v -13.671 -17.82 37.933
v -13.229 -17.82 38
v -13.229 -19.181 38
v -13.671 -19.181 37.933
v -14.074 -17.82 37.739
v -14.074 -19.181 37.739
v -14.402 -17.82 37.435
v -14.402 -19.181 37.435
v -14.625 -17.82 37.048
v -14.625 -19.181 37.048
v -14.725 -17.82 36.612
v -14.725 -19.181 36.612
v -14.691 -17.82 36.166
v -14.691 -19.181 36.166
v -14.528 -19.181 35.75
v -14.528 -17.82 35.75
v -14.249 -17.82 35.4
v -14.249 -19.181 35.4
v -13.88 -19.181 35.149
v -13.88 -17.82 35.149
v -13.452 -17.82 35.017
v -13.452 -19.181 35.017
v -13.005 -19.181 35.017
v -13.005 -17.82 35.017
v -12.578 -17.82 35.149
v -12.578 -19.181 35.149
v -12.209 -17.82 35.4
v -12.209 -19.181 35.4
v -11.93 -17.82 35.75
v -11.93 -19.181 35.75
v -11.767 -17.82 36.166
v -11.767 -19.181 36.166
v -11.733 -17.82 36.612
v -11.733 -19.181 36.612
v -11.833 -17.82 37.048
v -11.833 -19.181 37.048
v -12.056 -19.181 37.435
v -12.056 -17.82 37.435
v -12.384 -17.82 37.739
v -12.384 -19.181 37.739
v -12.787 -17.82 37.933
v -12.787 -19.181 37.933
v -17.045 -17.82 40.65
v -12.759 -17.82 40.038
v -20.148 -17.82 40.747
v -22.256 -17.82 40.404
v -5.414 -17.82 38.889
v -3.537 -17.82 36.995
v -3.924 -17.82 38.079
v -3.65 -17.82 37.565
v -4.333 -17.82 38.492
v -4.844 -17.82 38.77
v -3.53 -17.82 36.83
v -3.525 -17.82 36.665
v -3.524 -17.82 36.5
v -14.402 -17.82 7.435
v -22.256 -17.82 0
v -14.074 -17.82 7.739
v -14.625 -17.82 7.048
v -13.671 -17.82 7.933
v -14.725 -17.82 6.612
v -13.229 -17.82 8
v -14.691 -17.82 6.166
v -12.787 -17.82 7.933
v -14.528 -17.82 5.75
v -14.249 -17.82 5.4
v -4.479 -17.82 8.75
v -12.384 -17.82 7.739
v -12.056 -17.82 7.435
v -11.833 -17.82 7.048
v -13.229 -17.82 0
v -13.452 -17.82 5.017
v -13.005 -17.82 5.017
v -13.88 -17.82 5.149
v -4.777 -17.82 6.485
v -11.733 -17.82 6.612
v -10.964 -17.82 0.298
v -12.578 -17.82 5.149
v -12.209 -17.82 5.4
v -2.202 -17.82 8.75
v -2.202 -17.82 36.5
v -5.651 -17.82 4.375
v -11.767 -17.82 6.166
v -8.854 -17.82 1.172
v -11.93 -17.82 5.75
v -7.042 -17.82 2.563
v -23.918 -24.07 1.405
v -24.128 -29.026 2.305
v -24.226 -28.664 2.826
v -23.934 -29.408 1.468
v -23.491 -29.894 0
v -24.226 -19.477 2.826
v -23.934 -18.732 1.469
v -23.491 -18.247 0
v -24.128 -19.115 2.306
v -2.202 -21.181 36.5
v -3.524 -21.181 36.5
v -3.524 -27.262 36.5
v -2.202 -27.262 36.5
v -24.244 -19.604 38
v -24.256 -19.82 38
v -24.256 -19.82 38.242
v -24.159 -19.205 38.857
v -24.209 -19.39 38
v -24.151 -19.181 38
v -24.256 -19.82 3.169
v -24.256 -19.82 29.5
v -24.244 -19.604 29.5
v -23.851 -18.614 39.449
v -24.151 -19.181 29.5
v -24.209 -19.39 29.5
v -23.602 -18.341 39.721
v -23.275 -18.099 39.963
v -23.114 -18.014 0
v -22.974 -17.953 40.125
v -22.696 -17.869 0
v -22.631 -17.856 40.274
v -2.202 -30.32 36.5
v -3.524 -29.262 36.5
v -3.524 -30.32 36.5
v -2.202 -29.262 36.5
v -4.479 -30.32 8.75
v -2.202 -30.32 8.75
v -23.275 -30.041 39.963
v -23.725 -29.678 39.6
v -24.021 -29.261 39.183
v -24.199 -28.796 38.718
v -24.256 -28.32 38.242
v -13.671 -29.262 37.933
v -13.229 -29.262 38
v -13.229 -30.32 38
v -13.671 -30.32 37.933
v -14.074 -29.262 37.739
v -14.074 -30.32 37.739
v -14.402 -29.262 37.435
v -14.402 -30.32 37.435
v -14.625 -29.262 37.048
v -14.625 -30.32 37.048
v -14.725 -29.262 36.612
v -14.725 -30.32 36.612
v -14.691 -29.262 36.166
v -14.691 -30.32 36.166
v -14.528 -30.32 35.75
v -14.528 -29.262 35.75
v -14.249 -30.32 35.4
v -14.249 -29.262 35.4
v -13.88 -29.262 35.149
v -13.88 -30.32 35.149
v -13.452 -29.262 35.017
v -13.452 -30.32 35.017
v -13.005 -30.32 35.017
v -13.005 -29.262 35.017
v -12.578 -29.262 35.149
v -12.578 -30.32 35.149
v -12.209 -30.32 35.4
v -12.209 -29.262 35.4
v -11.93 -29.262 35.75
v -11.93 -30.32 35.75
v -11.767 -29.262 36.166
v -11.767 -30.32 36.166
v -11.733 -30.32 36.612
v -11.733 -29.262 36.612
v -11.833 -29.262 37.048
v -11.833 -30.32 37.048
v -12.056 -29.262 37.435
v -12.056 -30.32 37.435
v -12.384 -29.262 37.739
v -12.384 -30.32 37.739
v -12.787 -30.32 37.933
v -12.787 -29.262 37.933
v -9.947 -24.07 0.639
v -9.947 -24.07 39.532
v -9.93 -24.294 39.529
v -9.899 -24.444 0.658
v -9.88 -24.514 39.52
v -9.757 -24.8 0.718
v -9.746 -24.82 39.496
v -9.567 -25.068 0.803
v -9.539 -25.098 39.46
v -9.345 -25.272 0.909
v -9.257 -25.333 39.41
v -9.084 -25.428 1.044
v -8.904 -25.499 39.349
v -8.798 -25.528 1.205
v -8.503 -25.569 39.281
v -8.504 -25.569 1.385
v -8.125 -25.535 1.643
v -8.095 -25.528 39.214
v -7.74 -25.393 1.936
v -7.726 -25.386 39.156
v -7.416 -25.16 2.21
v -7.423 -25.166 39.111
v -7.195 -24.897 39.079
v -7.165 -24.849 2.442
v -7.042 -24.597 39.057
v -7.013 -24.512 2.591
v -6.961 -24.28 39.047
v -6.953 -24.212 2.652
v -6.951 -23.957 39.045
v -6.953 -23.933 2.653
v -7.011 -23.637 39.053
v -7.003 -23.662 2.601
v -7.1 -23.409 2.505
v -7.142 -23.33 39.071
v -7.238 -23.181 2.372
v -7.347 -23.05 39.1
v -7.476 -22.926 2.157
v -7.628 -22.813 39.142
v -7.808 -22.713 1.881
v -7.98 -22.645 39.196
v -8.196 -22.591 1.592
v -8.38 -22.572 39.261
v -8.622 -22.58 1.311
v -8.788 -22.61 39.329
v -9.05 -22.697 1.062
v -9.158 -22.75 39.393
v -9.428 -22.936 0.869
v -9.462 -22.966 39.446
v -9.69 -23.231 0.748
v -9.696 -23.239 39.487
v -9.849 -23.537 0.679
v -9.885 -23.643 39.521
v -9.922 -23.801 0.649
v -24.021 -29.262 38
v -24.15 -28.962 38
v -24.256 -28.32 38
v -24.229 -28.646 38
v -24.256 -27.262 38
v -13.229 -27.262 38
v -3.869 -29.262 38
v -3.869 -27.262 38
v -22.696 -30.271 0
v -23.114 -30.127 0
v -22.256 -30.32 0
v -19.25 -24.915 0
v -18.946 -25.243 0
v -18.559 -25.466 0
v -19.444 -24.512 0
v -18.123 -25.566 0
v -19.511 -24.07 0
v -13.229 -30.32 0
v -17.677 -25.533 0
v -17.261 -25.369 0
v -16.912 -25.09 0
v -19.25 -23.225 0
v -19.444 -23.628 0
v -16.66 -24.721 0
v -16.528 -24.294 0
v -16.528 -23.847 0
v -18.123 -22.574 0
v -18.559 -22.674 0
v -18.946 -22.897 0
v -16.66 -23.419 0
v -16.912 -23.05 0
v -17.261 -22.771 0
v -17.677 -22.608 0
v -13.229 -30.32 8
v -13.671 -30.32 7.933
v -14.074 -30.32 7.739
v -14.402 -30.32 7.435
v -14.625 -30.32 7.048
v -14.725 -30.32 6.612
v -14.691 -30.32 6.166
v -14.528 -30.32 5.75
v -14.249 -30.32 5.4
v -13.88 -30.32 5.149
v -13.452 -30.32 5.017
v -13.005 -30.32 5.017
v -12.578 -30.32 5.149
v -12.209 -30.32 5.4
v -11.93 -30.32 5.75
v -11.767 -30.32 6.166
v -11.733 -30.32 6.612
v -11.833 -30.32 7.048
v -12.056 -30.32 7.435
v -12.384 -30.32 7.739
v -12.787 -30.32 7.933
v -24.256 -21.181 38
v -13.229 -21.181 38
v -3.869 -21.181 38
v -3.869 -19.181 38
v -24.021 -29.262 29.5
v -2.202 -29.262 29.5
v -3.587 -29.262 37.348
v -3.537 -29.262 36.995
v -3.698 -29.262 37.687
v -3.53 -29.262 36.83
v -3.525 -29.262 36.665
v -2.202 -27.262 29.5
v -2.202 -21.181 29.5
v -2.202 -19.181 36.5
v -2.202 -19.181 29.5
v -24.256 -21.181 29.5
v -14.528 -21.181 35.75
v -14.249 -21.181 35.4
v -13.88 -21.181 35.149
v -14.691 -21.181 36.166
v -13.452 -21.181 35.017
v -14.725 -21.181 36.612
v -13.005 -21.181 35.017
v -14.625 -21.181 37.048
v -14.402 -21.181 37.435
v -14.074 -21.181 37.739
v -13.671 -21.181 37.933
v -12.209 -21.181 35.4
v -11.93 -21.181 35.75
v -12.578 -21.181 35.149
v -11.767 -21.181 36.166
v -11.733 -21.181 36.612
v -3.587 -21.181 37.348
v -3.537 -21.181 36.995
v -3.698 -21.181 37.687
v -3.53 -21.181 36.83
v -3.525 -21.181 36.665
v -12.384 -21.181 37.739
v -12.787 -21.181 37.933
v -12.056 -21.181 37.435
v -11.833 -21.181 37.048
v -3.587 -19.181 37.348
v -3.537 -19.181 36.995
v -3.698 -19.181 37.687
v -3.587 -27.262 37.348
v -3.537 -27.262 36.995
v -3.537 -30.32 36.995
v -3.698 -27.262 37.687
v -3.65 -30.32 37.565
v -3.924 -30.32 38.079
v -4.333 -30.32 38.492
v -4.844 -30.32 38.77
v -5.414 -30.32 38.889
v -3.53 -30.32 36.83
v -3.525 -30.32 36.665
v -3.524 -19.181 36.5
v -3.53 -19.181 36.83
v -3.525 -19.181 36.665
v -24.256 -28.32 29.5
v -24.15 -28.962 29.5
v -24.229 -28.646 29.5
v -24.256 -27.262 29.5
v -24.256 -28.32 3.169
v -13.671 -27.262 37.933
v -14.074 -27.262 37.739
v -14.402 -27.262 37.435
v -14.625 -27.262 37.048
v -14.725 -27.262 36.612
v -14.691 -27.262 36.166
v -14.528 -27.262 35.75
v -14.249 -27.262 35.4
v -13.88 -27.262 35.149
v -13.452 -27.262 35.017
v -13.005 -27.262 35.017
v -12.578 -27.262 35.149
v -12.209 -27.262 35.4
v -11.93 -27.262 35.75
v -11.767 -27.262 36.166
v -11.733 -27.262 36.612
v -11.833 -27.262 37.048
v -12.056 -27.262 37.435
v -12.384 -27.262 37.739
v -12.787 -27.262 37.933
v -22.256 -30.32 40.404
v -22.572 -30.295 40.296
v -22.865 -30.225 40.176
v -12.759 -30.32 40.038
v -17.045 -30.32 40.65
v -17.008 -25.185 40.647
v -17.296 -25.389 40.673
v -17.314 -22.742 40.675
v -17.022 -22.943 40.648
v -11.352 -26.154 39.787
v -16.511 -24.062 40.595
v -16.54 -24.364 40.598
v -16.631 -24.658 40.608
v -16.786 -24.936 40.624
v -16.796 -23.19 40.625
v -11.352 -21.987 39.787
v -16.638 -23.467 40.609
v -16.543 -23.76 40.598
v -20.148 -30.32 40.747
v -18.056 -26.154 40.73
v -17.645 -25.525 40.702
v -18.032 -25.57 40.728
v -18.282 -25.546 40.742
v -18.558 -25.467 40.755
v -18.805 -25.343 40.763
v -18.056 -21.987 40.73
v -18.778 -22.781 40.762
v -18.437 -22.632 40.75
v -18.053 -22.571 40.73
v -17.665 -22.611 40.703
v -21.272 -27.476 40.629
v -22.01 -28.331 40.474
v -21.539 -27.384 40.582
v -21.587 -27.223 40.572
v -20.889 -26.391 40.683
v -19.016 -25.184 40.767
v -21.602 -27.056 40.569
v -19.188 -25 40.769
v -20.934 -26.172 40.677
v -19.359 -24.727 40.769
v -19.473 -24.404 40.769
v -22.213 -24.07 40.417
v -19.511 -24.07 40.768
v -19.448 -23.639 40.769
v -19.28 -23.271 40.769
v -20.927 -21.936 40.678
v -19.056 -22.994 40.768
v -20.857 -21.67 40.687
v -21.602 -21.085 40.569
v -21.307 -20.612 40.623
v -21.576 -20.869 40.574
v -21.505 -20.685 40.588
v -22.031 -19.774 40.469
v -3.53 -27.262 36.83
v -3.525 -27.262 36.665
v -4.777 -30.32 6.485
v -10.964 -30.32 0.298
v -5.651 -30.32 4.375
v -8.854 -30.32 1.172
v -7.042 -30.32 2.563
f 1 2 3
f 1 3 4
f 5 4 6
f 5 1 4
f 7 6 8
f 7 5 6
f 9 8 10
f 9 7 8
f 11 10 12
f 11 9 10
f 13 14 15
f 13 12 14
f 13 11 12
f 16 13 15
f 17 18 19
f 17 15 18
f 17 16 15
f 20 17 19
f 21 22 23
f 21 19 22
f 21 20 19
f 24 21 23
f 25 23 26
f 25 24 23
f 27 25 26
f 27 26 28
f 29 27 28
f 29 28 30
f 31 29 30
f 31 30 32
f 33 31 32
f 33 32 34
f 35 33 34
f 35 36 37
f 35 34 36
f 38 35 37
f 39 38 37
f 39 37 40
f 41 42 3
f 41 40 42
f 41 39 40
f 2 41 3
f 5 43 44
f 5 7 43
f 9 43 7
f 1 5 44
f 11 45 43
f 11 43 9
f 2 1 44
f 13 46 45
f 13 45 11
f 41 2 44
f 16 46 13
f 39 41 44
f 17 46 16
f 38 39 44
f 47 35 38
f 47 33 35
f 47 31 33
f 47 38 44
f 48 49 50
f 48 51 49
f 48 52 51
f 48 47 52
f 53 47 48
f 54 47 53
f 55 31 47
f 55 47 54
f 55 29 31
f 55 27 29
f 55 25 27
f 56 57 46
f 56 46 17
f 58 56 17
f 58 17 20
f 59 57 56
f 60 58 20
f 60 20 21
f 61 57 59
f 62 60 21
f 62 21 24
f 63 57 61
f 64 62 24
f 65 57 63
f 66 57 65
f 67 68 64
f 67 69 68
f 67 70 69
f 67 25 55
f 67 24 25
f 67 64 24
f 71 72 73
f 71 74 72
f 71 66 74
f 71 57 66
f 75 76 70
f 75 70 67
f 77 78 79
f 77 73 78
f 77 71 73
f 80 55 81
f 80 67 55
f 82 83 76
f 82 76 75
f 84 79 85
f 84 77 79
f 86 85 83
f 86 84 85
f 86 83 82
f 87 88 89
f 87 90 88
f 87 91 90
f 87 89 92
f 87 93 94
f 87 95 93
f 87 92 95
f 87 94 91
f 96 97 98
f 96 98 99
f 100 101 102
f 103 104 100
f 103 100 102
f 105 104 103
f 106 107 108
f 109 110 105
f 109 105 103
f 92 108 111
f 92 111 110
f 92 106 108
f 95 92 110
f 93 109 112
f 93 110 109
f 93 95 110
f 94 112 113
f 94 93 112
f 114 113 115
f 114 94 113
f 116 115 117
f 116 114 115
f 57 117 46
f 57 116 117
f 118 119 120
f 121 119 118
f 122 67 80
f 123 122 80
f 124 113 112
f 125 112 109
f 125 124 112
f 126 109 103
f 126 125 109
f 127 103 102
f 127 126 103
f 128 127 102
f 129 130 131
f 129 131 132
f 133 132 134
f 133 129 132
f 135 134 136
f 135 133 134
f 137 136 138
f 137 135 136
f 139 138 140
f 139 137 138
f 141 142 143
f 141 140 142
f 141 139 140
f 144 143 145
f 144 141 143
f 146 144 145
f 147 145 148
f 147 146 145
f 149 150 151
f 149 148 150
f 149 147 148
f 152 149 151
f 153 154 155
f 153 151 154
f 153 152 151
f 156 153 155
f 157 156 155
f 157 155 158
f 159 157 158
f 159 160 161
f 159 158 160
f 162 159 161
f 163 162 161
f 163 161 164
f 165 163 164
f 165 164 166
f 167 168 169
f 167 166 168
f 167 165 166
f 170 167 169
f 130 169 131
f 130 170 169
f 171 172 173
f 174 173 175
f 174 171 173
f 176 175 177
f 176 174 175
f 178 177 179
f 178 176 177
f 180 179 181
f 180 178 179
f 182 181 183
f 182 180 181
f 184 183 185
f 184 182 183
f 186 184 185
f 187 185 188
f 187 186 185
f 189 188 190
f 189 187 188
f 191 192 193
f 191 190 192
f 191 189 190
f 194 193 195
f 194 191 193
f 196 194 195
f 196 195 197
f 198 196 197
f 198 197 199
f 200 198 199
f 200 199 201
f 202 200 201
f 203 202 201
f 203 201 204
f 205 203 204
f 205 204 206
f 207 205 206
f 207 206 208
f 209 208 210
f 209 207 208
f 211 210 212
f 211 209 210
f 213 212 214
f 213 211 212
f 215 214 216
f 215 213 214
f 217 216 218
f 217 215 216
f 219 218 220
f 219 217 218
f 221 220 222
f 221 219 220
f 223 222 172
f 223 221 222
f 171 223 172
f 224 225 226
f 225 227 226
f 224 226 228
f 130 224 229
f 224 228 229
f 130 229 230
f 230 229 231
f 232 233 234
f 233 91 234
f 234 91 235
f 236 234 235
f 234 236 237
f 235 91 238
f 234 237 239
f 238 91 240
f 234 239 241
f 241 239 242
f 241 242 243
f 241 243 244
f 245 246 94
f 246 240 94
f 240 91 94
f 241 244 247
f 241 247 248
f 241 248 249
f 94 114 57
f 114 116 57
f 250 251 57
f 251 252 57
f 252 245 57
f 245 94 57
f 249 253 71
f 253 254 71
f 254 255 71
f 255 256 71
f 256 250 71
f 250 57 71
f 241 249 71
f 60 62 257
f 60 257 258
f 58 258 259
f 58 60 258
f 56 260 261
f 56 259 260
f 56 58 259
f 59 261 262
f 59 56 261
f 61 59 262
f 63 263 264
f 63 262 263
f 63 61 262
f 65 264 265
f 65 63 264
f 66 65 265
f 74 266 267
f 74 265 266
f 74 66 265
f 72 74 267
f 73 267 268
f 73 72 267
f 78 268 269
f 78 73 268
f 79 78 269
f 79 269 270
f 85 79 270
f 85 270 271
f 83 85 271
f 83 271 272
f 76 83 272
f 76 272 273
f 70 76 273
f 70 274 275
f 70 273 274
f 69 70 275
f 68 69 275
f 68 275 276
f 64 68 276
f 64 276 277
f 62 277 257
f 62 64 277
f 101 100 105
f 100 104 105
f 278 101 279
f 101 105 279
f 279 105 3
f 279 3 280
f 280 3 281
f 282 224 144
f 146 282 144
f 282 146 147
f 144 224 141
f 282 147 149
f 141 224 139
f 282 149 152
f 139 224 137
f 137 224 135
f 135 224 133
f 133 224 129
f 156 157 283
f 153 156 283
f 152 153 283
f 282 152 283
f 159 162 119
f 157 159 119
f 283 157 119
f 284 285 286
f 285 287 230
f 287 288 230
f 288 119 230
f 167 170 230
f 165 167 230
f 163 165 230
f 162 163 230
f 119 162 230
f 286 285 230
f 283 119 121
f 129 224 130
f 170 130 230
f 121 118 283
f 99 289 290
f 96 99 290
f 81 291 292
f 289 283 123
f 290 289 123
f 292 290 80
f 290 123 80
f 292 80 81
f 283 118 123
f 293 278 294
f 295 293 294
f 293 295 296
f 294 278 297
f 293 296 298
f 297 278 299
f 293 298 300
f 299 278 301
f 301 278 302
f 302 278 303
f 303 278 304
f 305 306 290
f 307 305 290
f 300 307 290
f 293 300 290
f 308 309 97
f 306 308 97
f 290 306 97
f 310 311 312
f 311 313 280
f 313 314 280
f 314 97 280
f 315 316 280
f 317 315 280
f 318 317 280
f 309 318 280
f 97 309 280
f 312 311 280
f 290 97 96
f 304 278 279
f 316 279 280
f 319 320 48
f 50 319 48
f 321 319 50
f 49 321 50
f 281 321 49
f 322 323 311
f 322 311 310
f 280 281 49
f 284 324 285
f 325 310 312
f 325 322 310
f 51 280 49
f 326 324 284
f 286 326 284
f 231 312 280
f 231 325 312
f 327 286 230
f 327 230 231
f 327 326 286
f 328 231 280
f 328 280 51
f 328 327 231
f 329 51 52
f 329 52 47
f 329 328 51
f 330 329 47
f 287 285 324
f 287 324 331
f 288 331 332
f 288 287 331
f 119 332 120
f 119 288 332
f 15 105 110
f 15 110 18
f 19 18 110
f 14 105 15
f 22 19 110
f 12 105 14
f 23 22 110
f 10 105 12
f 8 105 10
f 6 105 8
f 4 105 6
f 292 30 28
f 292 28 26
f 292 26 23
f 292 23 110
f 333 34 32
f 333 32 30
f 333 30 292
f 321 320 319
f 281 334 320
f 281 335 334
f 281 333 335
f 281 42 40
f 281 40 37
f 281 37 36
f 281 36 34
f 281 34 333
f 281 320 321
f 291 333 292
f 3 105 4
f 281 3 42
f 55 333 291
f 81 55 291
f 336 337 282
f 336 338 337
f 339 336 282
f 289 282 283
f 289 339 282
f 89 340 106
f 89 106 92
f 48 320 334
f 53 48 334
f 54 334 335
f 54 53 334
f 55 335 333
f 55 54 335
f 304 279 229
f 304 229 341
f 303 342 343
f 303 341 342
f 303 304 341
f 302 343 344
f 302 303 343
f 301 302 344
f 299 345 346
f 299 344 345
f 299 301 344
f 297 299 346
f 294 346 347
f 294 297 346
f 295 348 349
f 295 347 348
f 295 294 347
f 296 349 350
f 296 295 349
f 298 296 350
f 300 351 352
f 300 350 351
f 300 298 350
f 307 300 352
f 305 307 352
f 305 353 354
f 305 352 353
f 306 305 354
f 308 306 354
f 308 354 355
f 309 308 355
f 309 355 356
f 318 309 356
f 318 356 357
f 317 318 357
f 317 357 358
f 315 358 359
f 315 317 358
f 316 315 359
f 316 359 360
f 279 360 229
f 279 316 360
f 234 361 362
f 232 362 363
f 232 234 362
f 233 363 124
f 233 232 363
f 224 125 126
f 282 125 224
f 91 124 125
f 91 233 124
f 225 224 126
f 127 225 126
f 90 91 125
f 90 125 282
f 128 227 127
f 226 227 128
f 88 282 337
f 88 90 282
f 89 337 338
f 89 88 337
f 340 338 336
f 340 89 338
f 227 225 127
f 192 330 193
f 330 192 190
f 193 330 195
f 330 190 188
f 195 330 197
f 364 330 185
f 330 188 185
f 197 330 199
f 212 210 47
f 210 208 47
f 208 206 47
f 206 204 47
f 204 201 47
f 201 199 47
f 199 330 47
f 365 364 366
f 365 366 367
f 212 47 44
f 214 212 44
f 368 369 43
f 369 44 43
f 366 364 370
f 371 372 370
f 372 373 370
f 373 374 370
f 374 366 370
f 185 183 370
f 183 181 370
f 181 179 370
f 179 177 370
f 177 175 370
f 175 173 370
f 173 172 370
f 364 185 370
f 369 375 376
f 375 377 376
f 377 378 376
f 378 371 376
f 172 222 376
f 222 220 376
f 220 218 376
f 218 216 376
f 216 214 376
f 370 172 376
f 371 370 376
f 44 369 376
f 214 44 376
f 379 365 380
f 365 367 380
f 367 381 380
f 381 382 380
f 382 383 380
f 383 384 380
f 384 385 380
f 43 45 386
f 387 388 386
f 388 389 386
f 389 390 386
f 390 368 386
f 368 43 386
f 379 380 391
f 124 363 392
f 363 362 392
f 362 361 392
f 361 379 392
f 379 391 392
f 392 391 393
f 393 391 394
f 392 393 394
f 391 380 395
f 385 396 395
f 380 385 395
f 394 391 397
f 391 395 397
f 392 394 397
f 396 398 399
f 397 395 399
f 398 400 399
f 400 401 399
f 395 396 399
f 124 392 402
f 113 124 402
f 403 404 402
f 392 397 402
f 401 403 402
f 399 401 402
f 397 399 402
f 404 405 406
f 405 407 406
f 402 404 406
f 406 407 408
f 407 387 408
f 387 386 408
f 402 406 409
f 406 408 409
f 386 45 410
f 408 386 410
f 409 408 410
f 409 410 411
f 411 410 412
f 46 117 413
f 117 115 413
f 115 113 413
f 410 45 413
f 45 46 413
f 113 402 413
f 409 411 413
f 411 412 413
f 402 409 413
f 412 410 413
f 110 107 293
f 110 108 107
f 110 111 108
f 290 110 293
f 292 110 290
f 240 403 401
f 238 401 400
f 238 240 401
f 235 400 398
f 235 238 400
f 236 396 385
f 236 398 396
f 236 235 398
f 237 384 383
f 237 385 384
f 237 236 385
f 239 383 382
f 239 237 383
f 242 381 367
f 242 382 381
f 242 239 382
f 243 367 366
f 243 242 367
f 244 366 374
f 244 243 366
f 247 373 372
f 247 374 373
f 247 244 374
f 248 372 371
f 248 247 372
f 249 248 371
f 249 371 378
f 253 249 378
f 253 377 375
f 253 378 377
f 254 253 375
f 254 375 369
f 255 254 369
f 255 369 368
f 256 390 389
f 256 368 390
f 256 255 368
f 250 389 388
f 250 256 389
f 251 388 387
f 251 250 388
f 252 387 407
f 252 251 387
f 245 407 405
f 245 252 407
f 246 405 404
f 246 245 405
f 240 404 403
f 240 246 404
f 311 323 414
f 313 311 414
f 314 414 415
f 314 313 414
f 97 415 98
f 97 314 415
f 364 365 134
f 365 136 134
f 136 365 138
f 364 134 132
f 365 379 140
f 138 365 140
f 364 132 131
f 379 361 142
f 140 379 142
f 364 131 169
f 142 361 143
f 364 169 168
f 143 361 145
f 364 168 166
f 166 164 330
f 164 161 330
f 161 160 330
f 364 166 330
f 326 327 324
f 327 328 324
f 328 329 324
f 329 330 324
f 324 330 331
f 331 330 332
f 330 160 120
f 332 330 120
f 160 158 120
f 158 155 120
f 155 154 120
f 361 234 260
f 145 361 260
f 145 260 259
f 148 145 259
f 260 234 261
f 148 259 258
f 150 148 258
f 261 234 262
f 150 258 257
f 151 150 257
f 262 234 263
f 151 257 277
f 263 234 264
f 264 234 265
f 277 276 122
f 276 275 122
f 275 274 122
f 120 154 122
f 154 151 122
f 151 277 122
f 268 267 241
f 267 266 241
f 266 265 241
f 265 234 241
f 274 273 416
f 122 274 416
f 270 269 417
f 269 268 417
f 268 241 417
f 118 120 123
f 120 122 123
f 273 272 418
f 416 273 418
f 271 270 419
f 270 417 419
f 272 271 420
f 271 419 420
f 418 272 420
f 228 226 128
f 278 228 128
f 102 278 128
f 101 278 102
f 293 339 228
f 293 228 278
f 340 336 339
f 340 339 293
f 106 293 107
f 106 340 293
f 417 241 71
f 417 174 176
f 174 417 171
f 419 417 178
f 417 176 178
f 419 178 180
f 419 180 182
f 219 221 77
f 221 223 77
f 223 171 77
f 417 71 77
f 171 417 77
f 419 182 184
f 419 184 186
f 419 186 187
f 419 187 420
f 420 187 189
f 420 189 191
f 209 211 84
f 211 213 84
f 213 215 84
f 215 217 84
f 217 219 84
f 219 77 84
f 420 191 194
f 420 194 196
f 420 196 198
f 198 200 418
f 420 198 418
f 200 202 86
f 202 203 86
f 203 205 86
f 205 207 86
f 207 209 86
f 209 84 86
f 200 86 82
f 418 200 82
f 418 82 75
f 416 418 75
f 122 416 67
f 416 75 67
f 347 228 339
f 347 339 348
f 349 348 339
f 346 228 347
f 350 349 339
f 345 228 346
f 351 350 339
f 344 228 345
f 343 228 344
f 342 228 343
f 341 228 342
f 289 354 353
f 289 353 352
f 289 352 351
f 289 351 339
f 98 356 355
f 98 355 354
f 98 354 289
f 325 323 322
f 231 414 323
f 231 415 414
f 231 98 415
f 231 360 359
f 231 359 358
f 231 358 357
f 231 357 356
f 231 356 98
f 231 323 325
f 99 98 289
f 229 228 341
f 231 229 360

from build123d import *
from OCP.BRepAlgoAPI import BRepAlgoAPI_Cut
from OCP.TopTools import TopTools_ListOfShape

# Parameters (mm, degrees)
SKETCH1_W               = 22.054431489
SKETCH1_H               = 12.5
BOSS_EXTRUDE1_DEPTH     = 43
CUT_EXTRUDE1_DEPTH      = 10
CUT_EXTRUDE1_DEPTH_BACK = 15
SKETCH2_R               = 1.5
FILLET3_START           = -1
FILLET3_DEPTH           = 42
FILLET3_START_2         = -31
FILLET3_2_DEPTH         = 14
SKETCH5_R               = 1.5
CUT_EXTRUDE4_DEPTH      = 57.301199739
SKETCH16_W              = 22.05443149
SKETCH16_H              = 2
CUT_EXTRUDE6_DEPTH      = 8.5
FILLET4_START           = -31
FILLET4_DEPTH           = 14


with BuildPart() as part:
    # Sketch1 → Boss-Extrude1 (new body)
    with BuildSketch(Plane.XY):
        with Locations((-13.228930986, -24.070183414)):
            Rectangle(SKETCH1_W, SKETCH1_H)
    extrude(amount=BOSS_EXTRUDE1_DEPTH)

    # Sketch2 → Cut-Extrude1 (cut, two sides: drawn at the far end of the back side and taken through both)
    with BuildSketch(Plane.XZ.offset(30.320183414).offset(-CUT_EXTRUDE1_DEPTH_BACK)):
        with Locations(Location((-13.228930986, 6.5, 0), (0, 0, 90))):
            Circle(SKETCH2_R)
        with Locations(Location((-13.228930986, 36.5, 0), (0, 0, 90))):
            Circle(SKETCH2_R)
        with BuildLine():
            Line((-3.524026068, 36.5), (-2.201715242, 36.5))
            add(Edge.make_bspline(
                [(-24.256146731, 33.845079723), (-30.410867424, 43.557524996), (-12.605557553, 54.855746483), (11.277296074, 42.57460591), (-2.201715242, 36.5)],
                knots=[0, 0, 0, 0, 0.503104745, 1, 1, 1, 1], degree=3))
            add(Edge.make_bspline(
                [(-3.83164653, 38.924092472), (-9.250736817, 38.125111697), (-28.532285754, 46.163812106), (-24.256146731, 33.845079723)],
                knots=[0, 0, 0, 0, 1, 1, 1, 1], degree=3))
            ThreePointArc((-3.83164653, 38.924092472), (-3.601238334, 37.721766617), (-3.524026068, 36.5))
        make_face()
        with BuildLine():
            Line((-4.478930986, 8.75), (-2.201715242, 8.75))
            add(Edge.make_bspline(
                [(-2.201715242, 8.75), (5.39210746, 3.880294823), (-0.777052631, -4.523329032), (-17.174300591, -10.623347238), (-34.821400648, -0.026005424), (-24.256146731, 8.75)],
                knots=[0, 0, 0, 0, 0.283272691, 0.504244858, 1, 1, 1, 1], degree=3))
            add(Edge.make_bspline(
                [(-23.490579314, 0), (-24.966512963, 4.237786421), (-24.256146731, 8.75)],
                knots=[0, 0, 0, 1, 1, 1], degree=2))
            Line((-23.490579314, 0), (-13.228930986, 0))
            ThreePointArc((-13.228930986, 0), (-7.041746651, 2.562815665), (-4.478930986, 8.75))
        make_face()
    extrude(amount=CUT_EXTRUDE1_DEPTH + CUT_EXTRUDE1_DEPTH_BACK, mode=Mode.SUBTRACT)


with BuildPart() as fillet3_tool:
    # Fillet3: read off the stored shape, not the designer's step
    # Fillet3 outline → Fillet3 (new body)
    with BuildSketch(Plane.XY.offset(FILLET3_START)):
        with BuildLine():
            Line((-24.256146731, -17.820183414), (-24.256146731, -19.820183414))
            ThreePointArc((-24.256146731, -19.820183414), (-23.670360293, -18.405969851), (-22.256146731, -17.820183414))
            Line((-22.256146731, -17.820183414), (-24.256146731, -17.820183414))
        make_face()
        with BuildLine():
            ThreePointArc((-22.256146731, -30.320183414), (-23.670360293, -29.734396976), (-24.256146731, -28.320183414))
            Line((-24.256146731, -28.320183414), (-24.256146731, -30.320183414))
            Line((-24.256146731, -30.320183414), (-22.256146731, -30.320183414))
        make_face()
    extrude(amount=FILLET3_DEPTH)


with BuildPart() as part_1:
    add(part.part)

    # Fillet3: cut by fillet3_tool, with a tolerance
    fillet3_stock = TopTools_ListOfShape()
    fillet3_stock.Append(part_1.part.wrapped)
    fillet3_tools = TopTools_ListOfShape()
    fillet3_tools.Append(fillet3_tool.part.wrapped)
    fillet3_cut = BRepAlgoAPI_Cut()
    fillet3_cut.SetArguments(fillet3_stock)
    fillet3_cut.SetTools(fillet3_tools)
    fillet3_cut.SetFuzzyValue(0.00001)
    fillet3_cut.Build()
    add(Compound.cast(fillet3_cut.Shape()).solids(), mode=Mode.REPLACE)


with BuildPart() as fillet3_2_tool:
    # Fillet3 2 outline → Fillet3 2 (new body)
    with BuildSketch(Plane(origin=(0, 0, 0), x_dir=(1, 0, 0), z_dir=(0, 1, 0)).offset(FILLET3_START_2)):
        with BuildLine():
            Line((-24.256146731, -3.001504812), (-24.256146731, -3.16929397))
            ThreePointArc((-24.256146731, -3.16929397), (-24.248700679, -2.996873655), (-24.226417966, -2.82573719))
            add(Edge.make_bspline(
                [(-24.226417966, -2.82573719), (-24.241732441, -2.913564505), (-24.256146731, -3.001504812)],
                knots=[0.329874436, 0.329874436, 0.329874436, 0.350165787, 0.350165787, 0.350165787], degree=2))
        make_face()
        with BuildLine():
            ThreePointArc((-23.275055203, -39.963216674), (-23.99364737, -39.232721814), (-24.256146731, -38.242221169))
            Line((-24.256146731, -38.242221169), (-24.256146731, -39.081457115))
            add(Edge.make_bspline(
                [(-24.256146731, -39.081457115), (-23.999461699, -39.439477902), (-23.668462552, -39.730301433), (-23.275055203, -39.963216674)],
                knots=[0.20342968, 0.20342968, 0.20342968, 0.20342968, 0.271697972, 0.271697972, 0.271697972, 0.271697972], degree=3))
        make_face()
    extrude(amount=FILLET3_2_DEPTH)


with BuildPart() as part_2:
    add(part_1.part)

    # Fillet3 2: cut by fillet3_2_tool, with a tolerance
    fillet3_2_stock = TopTools_ListOfShape()
    fillet3_2_stock.Append(part_2.part.wrapped)
    fillet3_2_tools = TopTools_ListOfShape()
    fillet3_2_tools.Append(fillet3_2_tool.part.wrapped)
    fillet3_2_cut = BRepAlgoAPI_Cut()
    fillet3_2_cut.SetArguments(fillet3_2_stock)
    fillet3_2_cut.SetTools(fillet3_2_tools)
    fillet3_2_cut.SetFuzzyValue(0.00001)
    fillet3_2_cut.Build()
    add(Compound.cast(fillet3_2_cut.Shape()).solids(), mode=Mode.REPLACE)

    # Sketch5 → Cut-Extrude4 (cut, through all)
    with BuildSketch(Plane.XY):
        with Locations(Location((-18.011106811, -24.070183414, 0), (0, 0, 180))):
            Circle(SKETCH5_R)
        with Locations(Location((-8.446755162, -24.070183414, 0), (0, 0, 180))):
            Circle(SKETCH5_R)
    extrude(amount=CUT_EXTRUDE4_DEPTH, mode=Mode.SUBTRACT)

    # Sketch16 → Cut-Extrude6 (cut)
    with BuildSketch(Plane.XY.offset(38)):
        with Locations((-13.228930985, -20.1809771)):
            Rectangle(SKETCH16_W, SKETCH16_H)
        with Locations((-13.228930985, -28.261916897)):
            Rectangle(SKETCH16_W, SKETCH16_H)
    extrude(amount=-CUT_EXTRUDE6_DEPTH, mode=Mode.SUBTRACT)

    # Fillet4: read off the stored shape, not the designer's step
    # Fillet4 outline → Fillet4 (cut)
    with BuildSketch(Plane(origin=(0, 0, 0), x_dir=(1, 0, 0), z_dir=(0, 1, 0)).offset(FILLET4_START)):
        with BuildLine():
            ThreePointArc((-3.536641618, -36.994677952), (-4.113301238, -38.300390358), (-5.413622589, -38.88910556))
            add(Edge.make_bspline(
                [(-5.413622589, -38.88910556), (-4.807642485, -38.852553426), (-4.273553237, -38.858938555), (-3.83164653, -38.924092472)],
                knots=[0.91845371, 0.91845371, 0.91845371, 0.91845371, 1, 1, 1, 1], degree=3))
            ThreePointArc((-3.83164653, -38.924092472), (-3.635515677, -37.966820429), (-3.536641618, -36.994677952))
        make_face()
    extrude(amount=FILLET4_DEPTH, mode=Mode.SUBTRACT)


solid = part_2.part
